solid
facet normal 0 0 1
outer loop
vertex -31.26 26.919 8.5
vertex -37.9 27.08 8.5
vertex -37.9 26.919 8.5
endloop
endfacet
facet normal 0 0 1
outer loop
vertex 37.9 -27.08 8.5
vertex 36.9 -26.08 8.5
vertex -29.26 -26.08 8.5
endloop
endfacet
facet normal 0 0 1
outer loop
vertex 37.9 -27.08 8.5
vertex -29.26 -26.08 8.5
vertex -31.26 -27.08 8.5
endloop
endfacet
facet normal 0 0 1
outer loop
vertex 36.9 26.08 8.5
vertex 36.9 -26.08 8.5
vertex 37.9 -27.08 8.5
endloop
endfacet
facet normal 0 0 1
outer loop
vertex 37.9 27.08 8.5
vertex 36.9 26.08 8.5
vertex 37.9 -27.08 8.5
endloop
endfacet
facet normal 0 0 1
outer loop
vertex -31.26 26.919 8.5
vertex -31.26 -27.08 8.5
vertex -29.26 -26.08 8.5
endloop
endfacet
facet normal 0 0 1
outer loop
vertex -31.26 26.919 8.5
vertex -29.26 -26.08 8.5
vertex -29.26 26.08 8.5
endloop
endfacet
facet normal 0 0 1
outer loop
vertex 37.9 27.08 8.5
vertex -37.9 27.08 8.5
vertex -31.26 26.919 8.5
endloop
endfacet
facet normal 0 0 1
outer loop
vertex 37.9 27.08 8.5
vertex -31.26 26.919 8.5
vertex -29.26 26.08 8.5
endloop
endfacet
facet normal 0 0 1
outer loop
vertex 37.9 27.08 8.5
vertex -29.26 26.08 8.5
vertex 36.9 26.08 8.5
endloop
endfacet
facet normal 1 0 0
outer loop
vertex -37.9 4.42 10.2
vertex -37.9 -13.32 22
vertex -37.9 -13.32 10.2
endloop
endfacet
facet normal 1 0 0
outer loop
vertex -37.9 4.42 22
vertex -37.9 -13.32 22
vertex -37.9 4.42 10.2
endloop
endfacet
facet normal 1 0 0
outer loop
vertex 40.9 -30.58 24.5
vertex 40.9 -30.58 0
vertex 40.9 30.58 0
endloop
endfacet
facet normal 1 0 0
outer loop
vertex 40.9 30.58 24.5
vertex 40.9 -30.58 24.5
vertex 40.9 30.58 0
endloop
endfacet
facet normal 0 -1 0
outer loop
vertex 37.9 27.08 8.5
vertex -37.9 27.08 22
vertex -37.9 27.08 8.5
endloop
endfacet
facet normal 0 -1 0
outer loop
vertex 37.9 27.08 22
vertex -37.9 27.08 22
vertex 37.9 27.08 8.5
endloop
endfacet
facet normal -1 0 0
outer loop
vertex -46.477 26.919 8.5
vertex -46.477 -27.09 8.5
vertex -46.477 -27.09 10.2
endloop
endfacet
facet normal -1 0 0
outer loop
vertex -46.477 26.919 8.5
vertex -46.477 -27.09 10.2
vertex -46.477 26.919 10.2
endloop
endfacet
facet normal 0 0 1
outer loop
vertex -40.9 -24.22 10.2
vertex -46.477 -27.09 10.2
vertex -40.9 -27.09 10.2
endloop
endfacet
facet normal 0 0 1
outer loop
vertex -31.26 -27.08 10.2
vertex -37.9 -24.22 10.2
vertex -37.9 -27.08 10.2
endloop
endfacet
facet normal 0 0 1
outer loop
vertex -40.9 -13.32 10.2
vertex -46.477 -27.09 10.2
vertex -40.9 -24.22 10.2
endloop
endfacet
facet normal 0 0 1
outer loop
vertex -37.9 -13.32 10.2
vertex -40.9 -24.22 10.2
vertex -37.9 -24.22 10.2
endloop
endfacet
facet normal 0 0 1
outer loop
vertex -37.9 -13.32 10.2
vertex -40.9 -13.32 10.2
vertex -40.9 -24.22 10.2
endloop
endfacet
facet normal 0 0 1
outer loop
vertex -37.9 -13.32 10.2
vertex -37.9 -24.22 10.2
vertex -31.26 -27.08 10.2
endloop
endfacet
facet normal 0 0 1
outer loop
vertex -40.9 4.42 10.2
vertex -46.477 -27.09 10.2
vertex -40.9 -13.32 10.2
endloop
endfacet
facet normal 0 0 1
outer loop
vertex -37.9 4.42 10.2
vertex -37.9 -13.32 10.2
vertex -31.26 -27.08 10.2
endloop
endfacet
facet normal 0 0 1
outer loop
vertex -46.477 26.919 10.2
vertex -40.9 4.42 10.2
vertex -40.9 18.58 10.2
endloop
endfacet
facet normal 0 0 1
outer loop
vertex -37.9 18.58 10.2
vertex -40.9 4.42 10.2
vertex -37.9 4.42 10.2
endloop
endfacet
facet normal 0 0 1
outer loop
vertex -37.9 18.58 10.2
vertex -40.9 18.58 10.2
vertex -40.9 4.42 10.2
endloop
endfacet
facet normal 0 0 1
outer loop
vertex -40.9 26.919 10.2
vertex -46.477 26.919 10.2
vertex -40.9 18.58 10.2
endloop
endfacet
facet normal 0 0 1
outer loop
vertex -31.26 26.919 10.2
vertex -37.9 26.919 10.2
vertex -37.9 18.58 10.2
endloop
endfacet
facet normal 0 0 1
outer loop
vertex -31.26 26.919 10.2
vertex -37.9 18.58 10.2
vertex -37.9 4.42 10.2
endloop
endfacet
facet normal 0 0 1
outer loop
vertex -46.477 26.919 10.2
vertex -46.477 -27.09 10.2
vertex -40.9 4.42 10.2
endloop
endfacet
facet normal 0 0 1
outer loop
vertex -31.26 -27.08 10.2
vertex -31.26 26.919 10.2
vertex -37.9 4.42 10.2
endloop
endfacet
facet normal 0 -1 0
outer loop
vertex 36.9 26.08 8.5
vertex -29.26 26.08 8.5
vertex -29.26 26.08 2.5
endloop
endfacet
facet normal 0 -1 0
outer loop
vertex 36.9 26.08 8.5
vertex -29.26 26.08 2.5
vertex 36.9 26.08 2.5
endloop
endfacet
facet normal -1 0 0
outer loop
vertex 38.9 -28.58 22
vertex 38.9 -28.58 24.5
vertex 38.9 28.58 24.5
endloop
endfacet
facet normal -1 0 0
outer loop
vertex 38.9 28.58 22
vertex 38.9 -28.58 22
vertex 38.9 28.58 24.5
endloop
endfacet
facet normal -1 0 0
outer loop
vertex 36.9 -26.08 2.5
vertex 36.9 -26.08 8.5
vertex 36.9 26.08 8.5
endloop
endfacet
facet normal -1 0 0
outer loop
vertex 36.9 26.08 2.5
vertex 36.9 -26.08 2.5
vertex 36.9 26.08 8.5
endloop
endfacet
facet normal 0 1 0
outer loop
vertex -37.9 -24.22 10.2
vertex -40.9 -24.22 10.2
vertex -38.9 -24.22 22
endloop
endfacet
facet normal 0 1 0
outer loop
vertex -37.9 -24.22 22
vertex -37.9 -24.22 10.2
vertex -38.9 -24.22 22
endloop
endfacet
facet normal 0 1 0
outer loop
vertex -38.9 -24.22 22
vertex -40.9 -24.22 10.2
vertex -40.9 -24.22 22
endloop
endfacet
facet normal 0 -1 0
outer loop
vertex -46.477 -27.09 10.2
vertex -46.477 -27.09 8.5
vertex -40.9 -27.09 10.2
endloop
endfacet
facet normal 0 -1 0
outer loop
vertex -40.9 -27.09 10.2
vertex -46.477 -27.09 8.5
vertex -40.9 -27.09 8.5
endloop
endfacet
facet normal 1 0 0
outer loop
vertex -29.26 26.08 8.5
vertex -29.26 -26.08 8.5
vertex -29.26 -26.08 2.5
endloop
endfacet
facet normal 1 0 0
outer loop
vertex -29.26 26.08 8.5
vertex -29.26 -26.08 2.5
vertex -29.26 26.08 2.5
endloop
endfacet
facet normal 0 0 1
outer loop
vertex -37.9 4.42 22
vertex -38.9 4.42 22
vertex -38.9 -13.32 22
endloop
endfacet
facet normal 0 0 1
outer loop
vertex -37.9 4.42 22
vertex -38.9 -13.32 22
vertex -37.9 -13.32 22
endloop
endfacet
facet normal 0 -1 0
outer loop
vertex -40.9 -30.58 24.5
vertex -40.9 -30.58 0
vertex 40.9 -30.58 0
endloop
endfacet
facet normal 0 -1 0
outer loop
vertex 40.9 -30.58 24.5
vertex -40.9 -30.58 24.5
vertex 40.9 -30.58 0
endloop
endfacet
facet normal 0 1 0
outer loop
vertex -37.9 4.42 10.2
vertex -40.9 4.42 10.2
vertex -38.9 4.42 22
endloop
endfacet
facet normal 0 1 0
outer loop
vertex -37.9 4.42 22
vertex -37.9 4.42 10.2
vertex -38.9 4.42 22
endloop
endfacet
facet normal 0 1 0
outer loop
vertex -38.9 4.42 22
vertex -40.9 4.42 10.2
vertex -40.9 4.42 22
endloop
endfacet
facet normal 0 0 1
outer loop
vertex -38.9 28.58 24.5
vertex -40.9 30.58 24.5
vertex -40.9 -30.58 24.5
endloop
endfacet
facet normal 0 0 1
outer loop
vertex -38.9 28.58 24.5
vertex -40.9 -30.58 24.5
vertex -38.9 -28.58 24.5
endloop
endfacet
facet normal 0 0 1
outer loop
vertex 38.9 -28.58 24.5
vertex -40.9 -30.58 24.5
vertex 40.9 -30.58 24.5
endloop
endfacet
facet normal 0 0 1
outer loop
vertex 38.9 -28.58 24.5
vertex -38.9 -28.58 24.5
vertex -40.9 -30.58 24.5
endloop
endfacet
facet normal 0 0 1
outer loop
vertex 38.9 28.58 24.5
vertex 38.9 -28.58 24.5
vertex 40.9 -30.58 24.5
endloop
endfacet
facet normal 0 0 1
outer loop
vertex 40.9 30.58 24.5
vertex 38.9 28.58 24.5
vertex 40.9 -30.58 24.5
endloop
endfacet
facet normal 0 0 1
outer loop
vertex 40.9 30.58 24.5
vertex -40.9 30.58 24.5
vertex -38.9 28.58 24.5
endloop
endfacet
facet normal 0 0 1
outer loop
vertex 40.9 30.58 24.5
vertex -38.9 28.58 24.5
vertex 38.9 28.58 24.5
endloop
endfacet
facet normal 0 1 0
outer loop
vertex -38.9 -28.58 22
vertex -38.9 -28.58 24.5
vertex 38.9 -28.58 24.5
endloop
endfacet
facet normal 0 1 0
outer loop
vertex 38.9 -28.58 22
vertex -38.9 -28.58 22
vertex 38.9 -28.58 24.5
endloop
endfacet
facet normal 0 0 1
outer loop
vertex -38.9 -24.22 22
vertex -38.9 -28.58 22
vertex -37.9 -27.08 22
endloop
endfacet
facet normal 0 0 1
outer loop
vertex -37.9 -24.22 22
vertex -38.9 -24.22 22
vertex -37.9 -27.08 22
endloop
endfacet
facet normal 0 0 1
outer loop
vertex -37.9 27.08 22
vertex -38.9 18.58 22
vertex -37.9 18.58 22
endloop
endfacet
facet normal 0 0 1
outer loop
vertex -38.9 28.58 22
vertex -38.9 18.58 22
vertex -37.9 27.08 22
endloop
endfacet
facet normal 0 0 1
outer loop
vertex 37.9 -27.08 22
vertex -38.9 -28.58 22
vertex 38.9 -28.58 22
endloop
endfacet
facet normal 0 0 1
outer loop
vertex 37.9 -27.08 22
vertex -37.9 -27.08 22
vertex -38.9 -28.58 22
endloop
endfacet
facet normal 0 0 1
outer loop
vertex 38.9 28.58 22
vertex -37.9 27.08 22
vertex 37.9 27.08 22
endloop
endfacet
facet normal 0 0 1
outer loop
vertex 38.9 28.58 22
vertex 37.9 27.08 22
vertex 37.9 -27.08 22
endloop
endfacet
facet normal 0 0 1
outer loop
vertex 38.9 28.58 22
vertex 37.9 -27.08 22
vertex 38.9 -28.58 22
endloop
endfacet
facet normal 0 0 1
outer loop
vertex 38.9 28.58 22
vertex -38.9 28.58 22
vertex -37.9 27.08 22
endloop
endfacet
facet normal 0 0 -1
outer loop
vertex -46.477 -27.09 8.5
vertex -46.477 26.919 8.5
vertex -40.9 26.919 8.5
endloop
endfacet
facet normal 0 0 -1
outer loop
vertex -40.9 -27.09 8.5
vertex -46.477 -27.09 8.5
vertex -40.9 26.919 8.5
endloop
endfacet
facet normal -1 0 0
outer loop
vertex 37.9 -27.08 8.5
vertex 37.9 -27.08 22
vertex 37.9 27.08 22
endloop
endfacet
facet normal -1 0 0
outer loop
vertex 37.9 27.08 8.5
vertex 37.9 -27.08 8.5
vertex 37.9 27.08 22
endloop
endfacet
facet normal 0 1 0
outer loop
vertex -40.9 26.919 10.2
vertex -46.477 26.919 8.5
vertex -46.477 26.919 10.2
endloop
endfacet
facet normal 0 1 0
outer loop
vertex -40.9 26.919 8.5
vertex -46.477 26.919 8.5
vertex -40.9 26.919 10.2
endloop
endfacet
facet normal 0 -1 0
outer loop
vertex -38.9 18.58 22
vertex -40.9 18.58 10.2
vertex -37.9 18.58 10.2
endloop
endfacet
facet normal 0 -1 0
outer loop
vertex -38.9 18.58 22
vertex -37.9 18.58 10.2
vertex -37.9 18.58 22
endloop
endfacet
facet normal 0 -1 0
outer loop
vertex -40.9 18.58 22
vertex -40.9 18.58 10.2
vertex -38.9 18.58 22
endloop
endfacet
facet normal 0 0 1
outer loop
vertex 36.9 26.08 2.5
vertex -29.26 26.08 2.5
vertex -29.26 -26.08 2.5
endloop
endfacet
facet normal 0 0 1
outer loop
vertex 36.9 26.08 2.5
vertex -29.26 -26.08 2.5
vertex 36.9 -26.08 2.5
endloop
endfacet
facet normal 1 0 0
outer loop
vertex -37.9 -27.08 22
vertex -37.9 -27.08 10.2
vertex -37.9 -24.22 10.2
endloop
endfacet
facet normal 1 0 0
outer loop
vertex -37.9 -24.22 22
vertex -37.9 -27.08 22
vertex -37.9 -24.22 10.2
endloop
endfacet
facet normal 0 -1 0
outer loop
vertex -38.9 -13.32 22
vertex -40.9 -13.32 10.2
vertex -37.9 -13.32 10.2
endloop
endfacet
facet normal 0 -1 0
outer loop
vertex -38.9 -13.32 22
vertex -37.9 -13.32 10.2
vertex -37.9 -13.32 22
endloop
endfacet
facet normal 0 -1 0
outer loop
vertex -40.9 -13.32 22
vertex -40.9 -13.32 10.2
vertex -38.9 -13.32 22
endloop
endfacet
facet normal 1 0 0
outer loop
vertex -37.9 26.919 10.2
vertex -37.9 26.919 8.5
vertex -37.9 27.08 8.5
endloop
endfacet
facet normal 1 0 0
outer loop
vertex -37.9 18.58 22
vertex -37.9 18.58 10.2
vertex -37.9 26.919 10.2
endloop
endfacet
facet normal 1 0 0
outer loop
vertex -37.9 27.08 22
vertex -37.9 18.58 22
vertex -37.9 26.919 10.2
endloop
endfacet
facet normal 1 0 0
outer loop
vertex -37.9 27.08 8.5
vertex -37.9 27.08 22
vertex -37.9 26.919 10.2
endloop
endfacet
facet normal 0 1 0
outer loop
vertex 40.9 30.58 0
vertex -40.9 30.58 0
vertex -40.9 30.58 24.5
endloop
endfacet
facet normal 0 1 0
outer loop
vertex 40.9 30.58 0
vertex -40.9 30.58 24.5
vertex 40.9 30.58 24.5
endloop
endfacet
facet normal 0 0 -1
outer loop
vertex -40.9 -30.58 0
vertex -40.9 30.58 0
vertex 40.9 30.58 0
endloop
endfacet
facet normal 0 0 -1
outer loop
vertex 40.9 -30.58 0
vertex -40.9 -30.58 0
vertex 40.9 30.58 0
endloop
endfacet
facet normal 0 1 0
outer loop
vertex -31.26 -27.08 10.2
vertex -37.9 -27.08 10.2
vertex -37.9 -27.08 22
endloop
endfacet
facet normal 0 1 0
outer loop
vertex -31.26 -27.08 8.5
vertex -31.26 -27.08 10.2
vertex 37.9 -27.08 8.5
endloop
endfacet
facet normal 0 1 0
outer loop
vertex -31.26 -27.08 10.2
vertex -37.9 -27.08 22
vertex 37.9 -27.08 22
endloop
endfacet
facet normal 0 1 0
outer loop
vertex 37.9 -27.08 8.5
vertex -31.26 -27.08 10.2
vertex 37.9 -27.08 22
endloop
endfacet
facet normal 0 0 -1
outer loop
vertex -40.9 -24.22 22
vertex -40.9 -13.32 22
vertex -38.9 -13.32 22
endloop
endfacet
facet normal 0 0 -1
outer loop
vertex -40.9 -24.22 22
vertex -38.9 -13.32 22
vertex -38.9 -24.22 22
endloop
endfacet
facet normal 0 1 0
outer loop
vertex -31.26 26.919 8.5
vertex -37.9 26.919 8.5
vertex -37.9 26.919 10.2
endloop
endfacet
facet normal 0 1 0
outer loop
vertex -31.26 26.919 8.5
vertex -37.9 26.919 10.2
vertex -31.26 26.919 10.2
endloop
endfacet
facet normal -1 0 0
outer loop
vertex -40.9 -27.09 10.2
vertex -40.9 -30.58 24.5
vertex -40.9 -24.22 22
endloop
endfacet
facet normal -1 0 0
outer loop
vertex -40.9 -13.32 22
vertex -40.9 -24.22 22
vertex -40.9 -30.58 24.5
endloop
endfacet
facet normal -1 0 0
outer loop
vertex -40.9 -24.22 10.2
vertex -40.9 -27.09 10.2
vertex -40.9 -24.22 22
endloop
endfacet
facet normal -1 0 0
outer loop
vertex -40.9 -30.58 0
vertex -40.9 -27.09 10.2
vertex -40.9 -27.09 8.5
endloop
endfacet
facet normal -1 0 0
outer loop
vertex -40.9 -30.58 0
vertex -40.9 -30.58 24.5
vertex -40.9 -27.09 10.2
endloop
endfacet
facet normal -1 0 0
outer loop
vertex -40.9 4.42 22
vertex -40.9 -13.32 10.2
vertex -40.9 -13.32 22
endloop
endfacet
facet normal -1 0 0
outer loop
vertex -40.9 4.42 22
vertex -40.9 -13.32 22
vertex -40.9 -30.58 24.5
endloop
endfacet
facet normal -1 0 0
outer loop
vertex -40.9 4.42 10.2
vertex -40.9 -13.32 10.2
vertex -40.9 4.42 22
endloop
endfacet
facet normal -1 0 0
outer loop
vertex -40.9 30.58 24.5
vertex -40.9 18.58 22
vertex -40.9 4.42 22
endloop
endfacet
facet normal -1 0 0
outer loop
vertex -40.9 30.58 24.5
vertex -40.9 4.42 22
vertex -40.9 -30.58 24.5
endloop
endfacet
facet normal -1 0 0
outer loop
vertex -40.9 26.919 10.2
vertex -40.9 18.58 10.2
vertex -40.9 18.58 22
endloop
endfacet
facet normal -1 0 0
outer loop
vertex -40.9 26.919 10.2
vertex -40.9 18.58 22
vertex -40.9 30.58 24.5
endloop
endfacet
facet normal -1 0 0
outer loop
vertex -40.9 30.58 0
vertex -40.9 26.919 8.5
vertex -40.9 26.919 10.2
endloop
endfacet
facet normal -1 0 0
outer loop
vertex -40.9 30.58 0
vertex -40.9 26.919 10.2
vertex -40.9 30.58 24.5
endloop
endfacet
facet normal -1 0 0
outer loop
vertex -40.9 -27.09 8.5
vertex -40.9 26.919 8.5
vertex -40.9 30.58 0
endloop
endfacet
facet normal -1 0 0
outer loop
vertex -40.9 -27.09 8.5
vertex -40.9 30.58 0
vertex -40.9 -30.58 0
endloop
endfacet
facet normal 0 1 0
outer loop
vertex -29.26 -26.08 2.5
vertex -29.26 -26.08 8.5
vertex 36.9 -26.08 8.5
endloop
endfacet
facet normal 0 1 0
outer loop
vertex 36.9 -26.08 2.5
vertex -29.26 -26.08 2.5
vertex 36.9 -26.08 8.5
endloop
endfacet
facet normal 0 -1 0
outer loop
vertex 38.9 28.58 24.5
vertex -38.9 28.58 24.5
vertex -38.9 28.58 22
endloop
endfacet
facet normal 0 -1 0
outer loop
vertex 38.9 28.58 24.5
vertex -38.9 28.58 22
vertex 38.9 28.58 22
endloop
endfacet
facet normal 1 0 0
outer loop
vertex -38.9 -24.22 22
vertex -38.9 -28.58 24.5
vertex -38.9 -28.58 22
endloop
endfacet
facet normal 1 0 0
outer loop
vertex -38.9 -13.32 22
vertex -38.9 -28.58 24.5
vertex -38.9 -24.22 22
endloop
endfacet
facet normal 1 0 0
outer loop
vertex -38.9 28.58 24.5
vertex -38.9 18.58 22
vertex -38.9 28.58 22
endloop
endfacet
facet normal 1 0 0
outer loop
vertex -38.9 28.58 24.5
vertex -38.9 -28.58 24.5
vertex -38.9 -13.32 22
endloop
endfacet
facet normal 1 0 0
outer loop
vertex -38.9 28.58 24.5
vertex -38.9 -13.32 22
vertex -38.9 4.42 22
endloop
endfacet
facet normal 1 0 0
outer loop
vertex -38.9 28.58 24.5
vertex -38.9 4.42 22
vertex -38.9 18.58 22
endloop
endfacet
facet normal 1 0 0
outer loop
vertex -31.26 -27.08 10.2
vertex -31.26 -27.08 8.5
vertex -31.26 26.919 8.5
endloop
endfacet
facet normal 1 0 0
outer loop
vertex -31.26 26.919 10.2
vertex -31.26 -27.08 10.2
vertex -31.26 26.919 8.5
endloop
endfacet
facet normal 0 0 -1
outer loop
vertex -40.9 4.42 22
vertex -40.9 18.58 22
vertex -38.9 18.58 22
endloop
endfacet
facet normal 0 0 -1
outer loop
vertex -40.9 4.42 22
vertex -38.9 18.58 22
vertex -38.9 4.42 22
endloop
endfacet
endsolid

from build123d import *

# Parameters (mm, degrees)
F0_W      = 81.8
F0_H      = 61.16
F1_DEPTH  = 24.5
F2_W      = 77.8
F2_H      = 57.16
F3_DEPTH  = 2.5
F4_W      = 75.8
F4_H      = 54.16
F5_DEPTH  = 13.5
F6_W      = 66.16
F6_H      = 52.16
F7_DEPTH  = 6
F8_W      = 15.217356
F8_H      = 54.009464
F9_DEPTH  = 1.7
F10_W     = 14.16
F10_H     = 11.8
F10_W_2   = 10.9
F11_DEPTH = 4


with BuildPart() as f1:
    # F0 (on Top) → F1 (new body)
    with BuildSketch(Plane.XY):
        Rectangle(F0_W, F0_H)
    extrude(amount=F1_DEPTH)

    # F2 (on face) → F3 (cut)
    with BuildSketch(Plane.XY.offset(24.5)):
        Rectangle(F2_W, F2_H)
    extrude(amount=-F3_DEPTH, mode=Mode.SUBTRACT)

    # F4 (on face) → F5 (cut)
    with BuildSketch(Plane.XY.offset(22)):
        Rectangle(F4_W, F4_H)
    extrude(amount=-F5_DEPTH, mode=Mode.SUBTRACT)

    # F6 (on face) → F7 (cut)
    with BuildSketch(Plane.XY.offset(8.5)):
        with Locations((3.82, 0)):
            Rectangle(F6_W, F6_H)
    extrude(amount=-F7_DEPTH, mode=Mode.SUBTRACT)

    # F8 (on face) → F9 (join)
    with BuildSketch(Plane.XY.offset(8.5)):
        with Locations((-38.868678, -0.085647)):
            Rectangle(F8_W, F8_H)
    extrude(amount=F9_DEPTH)

    # F10 (on face) → F11 (cut)
    with BuildSketch(Plane(origin=(-40.9, 0, 0), x_dir=(0, -1, 0), z_dir=(-1, 0, 0))):
        with Locations((-11.5, 16.1)):
            Rectangle(F10_W, F10_H)
        with Locations((18.77, 16.1)):
            Rectangle(F10_W_2, F10_H)
    extrude(amount=-F11_DEPTH, mode=Mode.SUBTRACT)


solid = f1.part
